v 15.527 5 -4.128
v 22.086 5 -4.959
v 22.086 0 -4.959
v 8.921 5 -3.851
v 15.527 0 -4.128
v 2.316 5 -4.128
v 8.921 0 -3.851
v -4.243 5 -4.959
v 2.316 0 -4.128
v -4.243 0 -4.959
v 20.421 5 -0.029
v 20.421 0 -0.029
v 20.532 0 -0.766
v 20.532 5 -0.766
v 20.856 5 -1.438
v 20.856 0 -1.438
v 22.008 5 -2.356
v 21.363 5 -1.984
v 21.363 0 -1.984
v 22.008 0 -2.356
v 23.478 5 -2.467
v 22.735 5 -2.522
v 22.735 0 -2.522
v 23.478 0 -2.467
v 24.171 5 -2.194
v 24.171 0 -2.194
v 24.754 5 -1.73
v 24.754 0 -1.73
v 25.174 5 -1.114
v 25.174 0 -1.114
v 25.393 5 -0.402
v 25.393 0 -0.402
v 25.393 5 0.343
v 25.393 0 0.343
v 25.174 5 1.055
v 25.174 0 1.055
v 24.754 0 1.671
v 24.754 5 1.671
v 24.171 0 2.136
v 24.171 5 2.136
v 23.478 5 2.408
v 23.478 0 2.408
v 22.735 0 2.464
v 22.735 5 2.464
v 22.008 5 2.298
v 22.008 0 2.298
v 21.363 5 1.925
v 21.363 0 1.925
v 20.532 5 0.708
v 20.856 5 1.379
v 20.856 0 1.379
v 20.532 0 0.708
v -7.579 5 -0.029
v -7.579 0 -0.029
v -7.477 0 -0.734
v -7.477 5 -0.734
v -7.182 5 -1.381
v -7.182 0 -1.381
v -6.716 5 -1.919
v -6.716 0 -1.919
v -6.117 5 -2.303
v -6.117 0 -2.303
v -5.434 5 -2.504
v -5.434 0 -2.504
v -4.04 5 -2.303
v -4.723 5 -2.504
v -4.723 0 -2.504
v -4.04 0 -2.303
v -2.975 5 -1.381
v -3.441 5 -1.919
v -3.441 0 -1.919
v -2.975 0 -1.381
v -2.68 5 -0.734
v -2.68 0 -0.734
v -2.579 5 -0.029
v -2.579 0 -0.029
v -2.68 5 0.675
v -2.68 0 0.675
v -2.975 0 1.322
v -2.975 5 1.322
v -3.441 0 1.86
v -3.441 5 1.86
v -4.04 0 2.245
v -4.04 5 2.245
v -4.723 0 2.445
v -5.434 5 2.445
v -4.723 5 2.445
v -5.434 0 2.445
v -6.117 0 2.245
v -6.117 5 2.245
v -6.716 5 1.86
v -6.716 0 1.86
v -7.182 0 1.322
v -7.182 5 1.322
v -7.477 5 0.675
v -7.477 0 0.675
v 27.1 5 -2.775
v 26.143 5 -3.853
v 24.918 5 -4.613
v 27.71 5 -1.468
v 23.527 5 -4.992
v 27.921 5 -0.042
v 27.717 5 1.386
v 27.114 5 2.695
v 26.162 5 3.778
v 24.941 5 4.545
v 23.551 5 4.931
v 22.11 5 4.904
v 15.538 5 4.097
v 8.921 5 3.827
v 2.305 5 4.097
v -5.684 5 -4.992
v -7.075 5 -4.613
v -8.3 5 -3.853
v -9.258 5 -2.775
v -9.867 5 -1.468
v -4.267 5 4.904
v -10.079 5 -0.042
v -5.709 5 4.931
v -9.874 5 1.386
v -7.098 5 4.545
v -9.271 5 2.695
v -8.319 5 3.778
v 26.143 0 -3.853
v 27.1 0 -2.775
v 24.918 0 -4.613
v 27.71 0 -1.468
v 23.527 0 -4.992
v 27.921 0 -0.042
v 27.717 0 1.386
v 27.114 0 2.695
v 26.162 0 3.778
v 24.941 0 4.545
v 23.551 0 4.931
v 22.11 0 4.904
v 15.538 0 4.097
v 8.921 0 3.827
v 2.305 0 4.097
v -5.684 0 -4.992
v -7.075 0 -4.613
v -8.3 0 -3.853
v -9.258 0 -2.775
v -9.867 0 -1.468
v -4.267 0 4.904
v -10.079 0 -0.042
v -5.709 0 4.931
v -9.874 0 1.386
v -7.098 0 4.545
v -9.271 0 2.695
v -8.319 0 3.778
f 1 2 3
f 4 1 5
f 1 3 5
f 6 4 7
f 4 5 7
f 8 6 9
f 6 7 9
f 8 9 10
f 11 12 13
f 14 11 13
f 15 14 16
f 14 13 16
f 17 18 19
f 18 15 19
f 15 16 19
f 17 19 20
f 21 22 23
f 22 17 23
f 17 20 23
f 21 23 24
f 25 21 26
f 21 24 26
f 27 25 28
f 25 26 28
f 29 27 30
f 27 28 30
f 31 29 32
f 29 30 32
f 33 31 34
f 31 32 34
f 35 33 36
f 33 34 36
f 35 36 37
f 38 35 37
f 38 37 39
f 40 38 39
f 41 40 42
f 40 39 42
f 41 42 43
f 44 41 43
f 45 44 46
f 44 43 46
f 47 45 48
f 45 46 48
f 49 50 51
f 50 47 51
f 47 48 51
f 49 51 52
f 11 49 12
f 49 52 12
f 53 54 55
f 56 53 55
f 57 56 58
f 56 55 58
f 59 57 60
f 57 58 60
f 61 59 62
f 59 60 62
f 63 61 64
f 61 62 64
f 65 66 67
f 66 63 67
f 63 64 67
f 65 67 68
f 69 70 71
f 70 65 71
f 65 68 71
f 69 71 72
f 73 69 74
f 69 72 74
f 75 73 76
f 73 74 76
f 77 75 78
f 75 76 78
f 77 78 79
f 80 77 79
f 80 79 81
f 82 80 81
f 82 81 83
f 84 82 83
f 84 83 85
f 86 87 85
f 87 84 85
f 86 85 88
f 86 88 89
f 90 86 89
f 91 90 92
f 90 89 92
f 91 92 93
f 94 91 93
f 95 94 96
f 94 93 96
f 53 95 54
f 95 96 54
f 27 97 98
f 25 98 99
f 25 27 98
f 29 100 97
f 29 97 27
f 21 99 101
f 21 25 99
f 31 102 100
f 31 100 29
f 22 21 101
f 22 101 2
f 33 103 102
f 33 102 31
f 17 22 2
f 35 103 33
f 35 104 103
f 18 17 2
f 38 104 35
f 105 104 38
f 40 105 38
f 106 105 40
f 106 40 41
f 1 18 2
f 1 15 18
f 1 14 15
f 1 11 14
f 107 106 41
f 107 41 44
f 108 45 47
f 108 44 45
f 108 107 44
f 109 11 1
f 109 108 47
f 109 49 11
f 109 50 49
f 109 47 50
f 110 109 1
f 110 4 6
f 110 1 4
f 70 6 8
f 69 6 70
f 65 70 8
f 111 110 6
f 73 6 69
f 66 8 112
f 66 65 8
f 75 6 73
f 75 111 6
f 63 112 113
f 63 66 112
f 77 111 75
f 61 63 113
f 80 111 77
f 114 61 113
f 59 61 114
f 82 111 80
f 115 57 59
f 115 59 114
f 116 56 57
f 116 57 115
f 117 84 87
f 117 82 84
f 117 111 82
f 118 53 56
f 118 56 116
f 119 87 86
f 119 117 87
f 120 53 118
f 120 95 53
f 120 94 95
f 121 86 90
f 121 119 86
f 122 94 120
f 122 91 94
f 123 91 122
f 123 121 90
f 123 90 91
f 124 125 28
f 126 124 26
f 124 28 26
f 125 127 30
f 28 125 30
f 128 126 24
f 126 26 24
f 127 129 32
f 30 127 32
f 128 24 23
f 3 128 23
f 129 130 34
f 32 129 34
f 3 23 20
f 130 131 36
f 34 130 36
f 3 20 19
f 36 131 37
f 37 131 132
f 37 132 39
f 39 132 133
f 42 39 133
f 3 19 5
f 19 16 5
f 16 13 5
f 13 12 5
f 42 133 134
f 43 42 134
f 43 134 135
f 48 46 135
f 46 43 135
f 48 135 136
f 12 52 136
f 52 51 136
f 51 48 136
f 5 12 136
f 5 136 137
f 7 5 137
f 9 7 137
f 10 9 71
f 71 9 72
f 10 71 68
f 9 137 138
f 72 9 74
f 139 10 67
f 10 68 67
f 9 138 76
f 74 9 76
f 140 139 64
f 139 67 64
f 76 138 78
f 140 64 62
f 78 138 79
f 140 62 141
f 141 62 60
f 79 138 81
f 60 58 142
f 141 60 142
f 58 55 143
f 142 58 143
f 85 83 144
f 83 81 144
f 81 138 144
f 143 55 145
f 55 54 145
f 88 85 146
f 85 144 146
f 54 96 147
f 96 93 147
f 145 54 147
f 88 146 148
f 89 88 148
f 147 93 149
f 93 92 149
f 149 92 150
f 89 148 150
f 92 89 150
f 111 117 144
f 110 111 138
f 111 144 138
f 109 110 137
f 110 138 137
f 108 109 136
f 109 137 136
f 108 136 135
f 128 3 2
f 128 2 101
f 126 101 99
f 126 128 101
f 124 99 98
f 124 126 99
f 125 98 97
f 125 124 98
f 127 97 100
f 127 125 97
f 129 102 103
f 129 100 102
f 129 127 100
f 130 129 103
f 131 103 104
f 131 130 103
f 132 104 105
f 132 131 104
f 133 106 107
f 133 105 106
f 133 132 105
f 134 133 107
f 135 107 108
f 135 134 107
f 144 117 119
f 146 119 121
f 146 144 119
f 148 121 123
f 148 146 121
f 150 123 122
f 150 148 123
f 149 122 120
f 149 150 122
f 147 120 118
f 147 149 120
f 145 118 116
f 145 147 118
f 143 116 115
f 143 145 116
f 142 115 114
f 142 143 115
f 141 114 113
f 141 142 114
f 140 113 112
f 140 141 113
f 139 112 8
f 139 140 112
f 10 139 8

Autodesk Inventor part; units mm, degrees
ref_plane "YZ Plane" through (0, 0, 0) normal (1, 0, 0) x (0, 1, 0)
ref_plane "XZ Plane" through (0, 0, 0) normal (0, 1, 0) x (-1, 0, 0)
ref_plane "XY Plane" through (0, 0, 0) normal (0, 0, 1) x (1, 0, 0)
sketch "Sketch1" plane through (0, 0, 0) normal (0, 1, 0) x (-1, 0, 0)
  line L0 (-22.9214, -0.0293) -> (5.0786, -0.0293)
  circle A0 centre (5.0786, -0.0293) radius 2.5
  circle A1 centre (-22.9214, -0.0293) radius 2.5
  circle A2 centre (-22.9214, -0.0293) radius 5
  circle A3 centre (5.0786, -0.0293) radius 5
  line L1 (-8.9214, -0.0293) -> (-8.9214, -3.8509)
  line L2 (-8.9214, -3.8509) -> (-8.9214, -0.0293)
  line L3 (-8.9214, -0.0293) -> (-8.9214, 3.8269)
  arc A4 (-22.1098, 4.9044) -> (4.267, 4.9044) centre (-8.9214, 85.0769) ccw
  arc A5 (4.2428, -4.9589) -> (-22.0856, -4.9589) centre (-8.9214, -82.6063) ccw
  point P0 (0, 0)
  dimension "d0" = 28
  dimension "d1" = 5
  dimension "d2" = 5
  dimension "d3" = 10
  dimension "d4" = 10
extrude "Extrusion1" add sketch "Sketch1" along normal blind 5
properties part number "body-connector"
